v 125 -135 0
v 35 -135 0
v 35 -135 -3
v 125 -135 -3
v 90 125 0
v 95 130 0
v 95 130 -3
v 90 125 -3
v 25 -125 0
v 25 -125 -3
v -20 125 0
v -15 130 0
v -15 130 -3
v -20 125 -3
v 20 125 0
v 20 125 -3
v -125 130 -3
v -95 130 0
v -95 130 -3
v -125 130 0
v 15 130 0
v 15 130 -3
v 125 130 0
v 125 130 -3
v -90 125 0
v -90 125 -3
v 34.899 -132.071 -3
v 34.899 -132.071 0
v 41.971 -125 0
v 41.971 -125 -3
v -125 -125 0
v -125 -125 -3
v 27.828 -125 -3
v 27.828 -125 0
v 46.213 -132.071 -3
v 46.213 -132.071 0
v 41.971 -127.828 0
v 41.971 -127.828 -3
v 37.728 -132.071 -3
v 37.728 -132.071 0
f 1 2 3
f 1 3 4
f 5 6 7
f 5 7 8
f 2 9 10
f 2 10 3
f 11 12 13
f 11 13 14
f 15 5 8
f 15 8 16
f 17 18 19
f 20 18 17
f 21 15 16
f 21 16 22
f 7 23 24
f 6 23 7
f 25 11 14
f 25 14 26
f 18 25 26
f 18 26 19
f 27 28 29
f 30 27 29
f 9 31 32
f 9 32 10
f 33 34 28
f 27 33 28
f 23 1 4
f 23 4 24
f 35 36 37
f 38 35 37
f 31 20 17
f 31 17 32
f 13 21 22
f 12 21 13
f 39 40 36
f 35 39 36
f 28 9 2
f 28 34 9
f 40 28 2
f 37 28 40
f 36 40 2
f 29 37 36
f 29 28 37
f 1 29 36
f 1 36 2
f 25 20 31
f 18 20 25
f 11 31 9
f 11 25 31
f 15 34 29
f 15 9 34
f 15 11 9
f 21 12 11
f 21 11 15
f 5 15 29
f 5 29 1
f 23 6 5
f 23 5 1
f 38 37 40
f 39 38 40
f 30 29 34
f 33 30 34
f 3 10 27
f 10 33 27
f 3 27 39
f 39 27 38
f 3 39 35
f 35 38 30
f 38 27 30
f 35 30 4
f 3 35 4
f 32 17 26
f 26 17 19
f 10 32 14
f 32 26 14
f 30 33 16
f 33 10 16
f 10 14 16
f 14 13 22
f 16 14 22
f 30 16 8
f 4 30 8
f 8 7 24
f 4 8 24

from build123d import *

# Parameters (mm, degrees)
BOSS_EXTRUDE5_DEPTH = 3
CUT_EXTRUDE1_DEPTH  = 9


with BuildPart() as part:
    # Sketch3 → Boss-Extrude5 (new body)
    with BuildSketch(Plane.XY):
        Polygon((-125, 125), (-125, -125), (25, -125), (35, -135), (125, -135), (125, -125), (125, 125), (125, 130), (95, 130), (90, 125), (20, 125), (15, 130), (-15, 130), (-20, 125), (-90, 125), (-95, 130), (-125, 130), align=None)
    extrude(amount=-BOSS_EXTRUDE5_DEPTH)

    # Sketch4 → Cut-Extrude1 (cut)
    with BuildSketch(Plane.XY):
        Polygon((34.899494937, -132.071067812), (41.970562748, -125), (27.828427125, -125), align=None)
        Polygon((37.727922061, -132.071067812), (46.213203436, -132.071067812), (41.970562748, -127.828427125), align=None)
    extrude(amount=-CUT_EXTRUDE1_DEPTH, mode=Mode.SUBTRACT)


solid = part.part
